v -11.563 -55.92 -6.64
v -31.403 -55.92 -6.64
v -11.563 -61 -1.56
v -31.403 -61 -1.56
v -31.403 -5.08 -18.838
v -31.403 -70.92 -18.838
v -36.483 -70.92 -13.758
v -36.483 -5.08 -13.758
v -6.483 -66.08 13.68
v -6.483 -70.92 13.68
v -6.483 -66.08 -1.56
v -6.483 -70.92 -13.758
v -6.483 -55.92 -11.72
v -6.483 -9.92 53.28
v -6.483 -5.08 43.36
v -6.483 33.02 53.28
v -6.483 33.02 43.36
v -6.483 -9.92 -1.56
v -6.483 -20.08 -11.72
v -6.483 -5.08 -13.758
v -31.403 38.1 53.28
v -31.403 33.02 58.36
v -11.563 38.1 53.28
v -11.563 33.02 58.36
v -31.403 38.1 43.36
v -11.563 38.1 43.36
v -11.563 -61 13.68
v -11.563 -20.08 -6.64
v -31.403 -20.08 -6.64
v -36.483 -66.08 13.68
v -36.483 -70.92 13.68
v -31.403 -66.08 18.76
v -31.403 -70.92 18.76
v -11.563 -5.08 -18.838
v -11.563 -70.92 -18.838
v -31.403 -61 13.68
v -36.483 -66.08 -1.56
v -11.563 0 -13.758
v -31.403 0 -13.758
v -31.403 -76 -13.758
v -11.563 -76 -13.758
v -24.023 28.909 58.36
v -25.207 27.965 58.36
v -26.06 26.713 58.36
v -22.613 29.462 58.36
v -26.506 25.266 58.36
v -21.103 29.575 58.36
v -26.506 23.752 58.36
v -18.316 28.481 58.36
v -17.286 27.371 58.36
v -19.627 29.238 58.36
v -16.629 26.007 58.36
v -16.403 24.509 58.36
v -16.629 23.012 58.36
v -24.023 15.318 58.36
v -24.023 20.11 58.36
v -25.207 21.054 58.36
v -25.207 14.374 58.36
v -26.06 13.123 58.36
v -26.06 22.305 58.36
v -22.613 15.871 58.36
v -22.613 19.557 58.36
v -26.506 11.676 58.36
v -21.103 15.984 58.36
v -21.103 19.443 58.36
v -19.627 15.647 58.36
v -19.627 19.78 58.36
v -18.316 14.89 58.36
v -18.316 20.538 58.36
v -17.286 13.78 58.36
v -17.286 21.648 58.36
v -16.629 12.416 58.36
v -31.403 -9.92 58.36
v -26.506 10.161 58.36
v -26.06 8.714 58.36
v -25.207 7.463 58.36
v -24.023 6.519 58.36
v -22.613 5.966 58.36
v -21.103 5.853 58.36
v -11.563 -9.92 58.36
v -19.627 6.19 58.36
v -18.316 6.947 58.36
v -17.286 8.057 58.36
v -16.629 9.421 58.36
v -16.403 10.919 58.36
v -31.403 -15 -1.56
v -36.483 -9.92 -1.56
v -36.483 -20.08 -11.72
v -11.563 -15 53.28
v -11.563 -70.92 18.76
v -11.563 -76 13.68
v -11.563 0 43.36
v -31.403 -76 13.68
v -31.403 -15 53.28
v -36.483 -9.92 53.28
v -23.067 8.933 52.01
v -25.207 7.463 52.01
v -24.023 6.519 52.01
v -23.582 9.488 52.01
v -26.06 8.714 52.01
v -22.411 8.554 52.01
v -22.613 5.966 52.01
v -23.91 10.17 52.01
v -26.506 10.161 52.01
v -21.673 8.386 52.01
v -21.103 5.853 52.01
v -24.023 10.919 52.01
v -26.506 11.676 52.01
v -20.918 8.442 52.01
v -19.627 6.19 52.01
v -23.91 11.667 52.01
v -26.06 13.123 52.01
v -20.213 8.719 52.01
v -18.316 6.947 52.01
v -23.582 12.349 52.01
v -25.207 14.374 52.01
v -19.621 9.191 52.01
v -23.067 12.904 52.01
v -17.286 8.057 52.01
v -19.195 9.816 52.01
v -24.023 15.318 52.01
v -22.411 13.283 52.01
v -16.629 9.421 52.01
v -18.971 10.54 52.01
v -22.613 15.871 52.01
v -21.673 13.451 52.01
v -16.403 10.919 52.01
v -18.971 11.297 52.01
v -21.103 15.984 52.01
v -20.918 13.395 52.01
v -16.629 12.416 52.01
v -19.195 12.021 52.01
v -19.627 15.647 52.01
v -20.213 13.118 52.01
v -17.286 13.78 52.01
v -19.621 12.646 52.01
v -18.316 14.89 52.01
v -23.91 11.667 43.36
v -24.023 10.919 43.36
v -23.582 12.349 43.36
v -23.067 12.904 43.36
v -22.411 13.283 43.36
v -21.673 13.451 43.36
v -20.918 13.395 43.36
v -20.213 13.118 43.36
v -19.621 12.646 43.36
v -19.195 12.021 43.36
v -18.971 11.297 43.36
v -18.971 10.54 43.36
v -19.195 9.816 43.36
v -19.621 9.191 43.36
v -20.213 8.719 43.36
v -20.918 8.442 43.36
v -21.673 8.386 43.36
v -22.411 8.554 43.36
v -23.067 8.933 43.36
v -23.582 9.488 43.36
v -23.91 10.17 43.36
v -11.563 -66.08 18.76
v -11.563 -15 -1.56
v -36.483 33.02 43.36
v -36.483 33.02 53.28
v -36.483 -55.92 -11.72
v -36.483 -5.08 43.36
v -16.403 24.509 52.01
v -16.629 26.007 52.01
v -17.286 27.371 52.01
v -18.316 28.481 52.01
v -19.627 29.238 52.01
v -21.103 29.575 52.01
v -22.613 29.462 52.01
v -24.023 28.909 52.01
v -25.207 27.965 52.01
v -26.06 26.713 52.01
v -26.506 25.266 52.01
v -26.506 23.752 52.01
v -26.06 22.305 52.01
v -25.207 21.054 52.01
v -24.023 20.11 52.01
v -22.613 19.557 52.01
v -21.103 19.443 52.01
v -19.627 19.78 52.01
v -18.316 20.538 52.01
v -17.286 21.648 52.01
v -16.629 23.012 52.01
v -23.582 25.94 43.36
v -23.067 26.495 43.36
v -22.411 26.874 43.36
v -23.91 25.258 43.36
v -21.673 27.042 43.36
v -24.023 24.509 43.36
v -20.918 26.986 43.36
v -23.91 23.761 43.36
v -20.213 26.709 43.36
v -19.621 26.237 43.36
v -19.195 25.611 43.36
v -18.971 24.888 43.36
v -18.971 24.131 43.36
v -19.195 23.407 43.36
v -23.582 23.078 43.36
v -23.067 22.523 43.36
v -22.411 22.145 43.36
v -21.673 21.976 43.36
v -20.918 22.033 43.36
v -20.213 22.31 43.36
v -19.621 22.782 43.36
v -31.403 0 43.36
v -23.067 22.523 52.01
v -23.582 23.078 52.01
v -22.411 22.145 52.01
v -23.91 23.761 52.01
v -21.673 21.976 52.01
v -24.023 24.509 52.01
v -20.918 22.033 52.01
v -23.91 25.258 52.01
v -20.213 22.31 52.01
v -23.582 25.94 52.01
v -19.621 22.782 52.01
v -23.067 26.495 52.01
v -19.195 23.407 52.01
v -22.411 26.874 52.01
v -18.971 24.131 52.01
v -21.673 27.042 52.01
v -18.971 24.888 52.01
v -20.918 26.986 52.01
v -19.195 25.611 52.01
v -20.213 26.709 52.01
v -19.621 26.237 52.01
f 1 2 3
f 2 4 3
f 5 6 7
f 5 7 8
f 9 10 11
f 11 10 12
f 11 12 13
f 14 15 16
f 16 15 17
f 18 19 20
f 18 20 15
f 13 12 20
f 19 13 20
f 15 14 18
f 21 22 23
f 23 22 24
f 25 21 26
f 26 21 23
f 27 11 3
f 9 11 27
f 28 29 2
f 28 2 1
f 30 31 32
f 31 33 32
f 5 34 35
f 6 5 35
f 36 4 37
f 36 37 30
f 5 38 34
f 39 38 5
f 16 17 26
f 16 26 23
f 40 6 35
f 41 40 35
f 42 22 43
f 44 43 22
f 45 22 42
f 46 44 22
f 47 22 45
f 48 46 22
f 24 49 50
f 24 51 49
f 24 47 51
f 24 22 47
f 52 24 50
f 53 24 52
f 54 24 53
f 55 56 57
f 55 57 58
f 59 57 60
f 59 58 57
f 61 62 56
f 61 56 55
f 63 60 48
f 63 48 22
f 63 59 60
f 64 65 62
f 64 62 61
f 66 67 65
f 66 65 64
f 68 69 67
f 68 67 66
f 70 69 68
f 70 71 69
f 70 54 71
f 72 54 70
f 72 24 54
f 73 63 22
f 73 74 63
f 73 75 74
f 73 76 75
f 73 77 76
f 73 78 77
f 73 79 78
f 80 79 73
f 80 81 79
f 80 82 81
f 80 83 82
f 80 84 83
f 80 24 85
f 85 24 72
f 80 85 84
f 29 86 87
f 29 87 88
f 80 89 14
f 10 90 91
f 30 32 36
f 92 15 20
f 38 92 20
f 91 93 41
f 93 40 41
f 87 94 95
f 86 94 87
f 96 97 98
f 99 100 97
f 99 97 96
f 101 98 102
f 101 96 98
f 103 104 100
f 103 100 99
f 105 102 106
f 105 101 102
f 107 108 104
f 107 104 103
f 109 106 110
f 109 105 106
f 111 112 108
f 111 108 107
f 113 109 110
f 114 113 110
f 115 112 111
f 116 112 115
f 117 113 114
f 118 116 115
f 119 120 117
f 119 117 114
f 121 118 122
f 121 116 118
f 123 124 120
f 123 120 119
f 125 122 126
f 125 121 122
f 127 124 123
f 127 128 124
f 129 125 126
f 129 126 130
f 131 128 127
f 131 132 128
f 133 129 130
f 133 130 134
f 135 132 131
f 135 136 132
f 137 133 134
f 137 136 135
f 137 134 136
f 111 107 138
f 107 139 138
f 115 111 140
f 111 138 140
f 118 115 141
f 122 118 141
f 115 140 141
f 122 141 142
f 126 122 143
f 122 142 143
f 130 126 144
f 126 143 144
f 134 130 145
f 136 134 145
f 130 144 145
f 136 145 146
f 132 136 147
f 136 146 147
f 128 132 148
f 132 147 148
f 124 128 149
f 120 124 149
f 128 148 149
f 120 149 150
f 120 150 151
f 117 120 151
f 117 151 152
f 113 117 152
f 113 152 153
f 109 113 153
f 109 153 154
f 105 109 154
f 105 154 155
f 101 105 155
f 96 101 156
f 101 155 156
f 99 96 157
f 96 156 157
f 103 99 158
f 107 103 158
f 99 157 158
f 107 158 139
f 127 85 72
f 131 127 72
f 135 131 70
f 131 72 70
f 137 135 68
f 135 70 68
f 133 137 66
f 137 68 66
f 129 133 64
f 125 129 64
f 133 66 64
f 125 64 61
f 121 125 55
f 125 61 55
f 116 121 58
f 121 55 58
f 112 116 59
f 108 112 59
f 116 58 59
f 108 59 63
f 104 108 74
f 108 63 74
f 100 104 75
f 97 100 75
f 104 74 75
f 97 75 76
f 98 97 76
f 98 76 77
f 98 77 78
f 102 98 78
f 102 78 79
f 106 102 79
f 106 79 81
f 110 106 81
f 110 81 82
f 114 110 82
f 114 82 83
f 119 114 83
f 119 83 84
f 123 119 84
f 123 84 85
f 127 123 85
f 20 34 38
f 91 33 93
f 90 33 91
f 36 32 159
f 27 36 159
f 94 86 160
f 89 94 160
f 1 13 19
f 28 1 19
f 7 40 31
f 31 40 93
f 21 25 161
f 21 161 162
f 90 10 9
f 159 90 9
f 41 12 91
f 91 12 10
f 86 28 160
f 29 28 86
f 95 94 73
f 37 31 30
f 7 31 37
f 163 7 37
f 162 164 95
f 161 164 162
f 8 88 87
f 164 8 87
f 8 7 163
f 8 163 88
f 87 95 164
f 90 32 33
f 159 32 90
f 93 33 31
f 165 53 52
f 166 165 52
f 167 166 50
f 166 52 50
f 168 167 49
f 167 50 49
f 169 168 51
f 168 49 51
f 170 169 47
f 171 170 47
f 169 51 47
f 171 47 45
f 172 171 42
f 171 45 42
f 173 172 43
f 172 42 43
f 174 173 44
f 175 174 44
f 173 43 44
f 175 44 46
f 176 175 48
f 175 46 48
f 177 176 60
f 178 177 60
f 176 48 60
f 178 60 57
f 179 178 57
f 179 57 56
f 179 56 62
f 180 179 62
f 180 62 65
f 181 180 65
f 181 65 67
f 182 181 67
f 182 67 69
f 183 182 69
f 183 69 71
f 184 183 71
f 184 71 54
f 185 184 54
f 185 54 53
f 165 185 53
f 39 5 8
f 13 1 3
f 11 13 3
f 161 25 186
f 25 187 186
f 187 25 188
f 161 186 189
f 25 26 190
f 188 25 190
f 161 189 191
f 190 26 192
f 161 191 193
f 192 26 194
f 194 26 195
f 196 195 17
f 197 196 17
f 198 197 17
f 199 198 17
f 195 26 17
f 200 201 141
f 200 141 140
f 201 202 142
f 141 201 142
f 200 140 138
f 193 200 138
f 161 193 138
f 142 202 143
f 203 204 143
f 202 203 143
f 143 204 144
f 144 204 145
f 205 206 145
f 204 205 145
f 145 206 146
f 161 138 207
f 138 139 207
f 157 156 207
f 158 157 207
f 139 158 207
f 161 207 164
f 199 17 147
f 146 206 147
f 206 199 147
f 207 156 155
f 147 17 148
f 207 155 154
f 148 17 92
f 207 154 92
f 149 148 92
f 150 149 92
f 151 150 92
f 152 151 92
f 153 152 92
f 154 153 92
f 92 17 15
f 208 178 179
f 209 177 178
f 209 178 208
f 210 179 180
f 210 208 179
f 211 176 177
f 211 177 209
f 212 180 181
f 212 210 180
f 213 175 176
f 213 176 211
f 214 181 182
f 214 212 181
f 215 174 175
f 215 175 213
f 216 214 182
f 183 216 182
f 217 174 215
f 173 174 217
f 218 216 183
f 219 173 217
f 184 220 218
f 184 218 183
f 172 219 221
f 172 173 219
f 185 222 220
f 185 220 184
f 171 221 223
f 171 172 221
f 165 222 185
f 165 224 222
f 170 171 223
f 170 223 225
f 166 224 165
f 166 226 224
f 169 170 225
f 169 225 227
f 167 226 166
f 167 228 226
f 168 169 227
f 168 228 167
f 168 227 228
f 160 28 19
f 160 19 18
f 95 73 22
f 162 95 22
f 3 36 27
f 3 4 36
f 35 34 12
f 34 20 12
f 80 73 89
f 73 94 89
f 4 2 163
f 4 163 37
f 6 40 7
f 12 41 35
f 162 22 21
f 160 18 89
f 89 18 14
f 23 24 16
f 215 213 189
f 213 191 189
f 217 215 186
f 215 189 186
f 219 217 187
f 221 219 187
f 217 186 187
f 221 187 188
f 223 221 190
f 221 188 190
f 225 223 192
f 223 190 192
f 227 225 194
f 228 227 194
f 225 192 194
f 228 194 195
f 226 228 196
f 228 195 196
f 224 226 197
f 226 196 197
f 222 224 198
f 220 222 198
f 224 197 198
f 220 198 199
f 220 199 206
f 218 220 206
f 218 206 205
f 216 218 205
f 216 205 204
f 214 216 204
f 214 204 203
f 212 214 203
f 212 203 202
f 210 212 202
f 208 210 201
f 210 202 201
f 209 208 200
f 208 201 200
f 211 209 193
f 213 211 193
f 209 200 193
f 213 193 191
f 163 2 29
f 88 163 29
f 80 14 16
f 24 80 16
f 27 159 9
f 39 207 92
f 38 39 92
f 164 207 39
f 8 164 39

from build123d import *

# Parameters (mm, degrees)
F0_W            = 30
F0_H            = 15
F0_H_2          = 50
F0_H_3          = 25.4
F1_DEPTH        = 15
F2_DEPTH        = 38.1
F5_W            = 38.1
F5_H            = 15
F6_ANGLE        = 60
F7_DEPTH        = 61
F8_DEPTH        = 15
F9_W            = 30
F9_H            = 15
F10_DEPTH       = 25.4
F12_DEPTH       = 26.924
F14_D           = 5.08
F14_CBORE_D     = 10.16
F14_CBORE_DEPTH = 6.35
F15_D           = 5.08
F15_CBORE_D     = 10.16
F15_CBORE_DEPTH = 6.35
F17_DEPTH       = 60.96
F18_DEPTH       = 45.212
F19_SIZE        = 5.08


# Not quite as in the source:
# - a feature of the source that left no trace in its solid (it failed there, or was rolled back) is left out


with BuildPart() as f1:
    # F0 (on Front) → F1 (new body)
    with BuildSketch(Plane.XZ):
        with Locations((-21.4830274055, 50.8597951472)):
            Rectangle(F0_W, F0_H)
        with Locations((-21.4830274055, 18.3597951472)):
            Rectangle(F0_W, F0_H_2)
        with Locations((-21.4830274055, -19.3402048528)):
            Rectangle(F0_W, F0_H_3)
    extrude(amount=F1_DEPTH)

    # F0 (on Front) → F2 (join)
    with BuildSketch(Plane.XZ):
        with Locations((-21.4830274055, 50.8597951472)):
            Rectangle(F0_W, F0_H)
    extrude(amount=-F2_DEPTH)

    # F5 (on face) → F6 (revolve)
    with BuildSketch(Plane.YZ.offset(-6.4830274055)):
        with Locations((19.05, 50.8597951472)):
            Rectangle(F5_W, F5_H)
    revolve(axis=Axis((-6.4830274055, 0, 50.8597951472), (0, 0, -1)), revolution_arc=F6_ANGLE)

    # F0 (on Front) → F7 (join)
    with BuildSketch(Plane.XZ):
        with Locations((-21.4830274055, -19.3402048528)):
            Rectangle(F0_W, F0_H_3)
    extrude(amount=F7_DEPTH)

    # F8 (add): a face of the model
    f8_faces = [f1.faces().sort_by_distance(p)[0] for p in [
        (-21.4830274055, -61, -19.3402048528),
    ]]
    extrude(f8_faces, amount=F8_DEPTH)

    # F9 (on face) → F10 (join)
    with BuildSketch(Plane.XY.offset(-6.6402048528)):
        with Locations((-21.4830274055, -68.5)):
            Rectangle(F9_W, F9_H)
    extrude(amount=F10_DEPTH)

    # F11 (on face) → F12 (cut)
    with BuildSketch(Plane.XY.offset(58.3597951472)):
        with BuildLine():
            Line((-6.4830274055, 38.1), (-6.4830274055, 0))
            Line((-6.4830274055, 0), (26.5125404787, 19.05))
            ThreePointArc((26.5125404787, 19.05), (12.5669725945, 32.9955678842), (-6.4830274055, 38.1))
        make_face()
    extrude(amount=-F12_DEPTH, mode=Mode.SUBTRACT)

    # F14 (through all)
    with Locations(Plane.XY.offset(58.3597951472)):
        with Locations((-21.4830274055, 24.5092792876)):
            CounterBoreHole(F14_D / 2, F14_CBORE_D / 2, F14_CBORE_DEPTH)

    # F15 (through all)
    with Locations(Plane.XY.offset(58.3597951472)):
        with Locations((-21.4830274055, 10.9185585752)):
            CounterBoreHole(F15_D / 2, F15_CBORE_D / 2, F15_CBORE_DEPTH)

    # F16 (on face) → F17 (cut)
    with BuildSketch(Plane.YZ.offset(-6.4830274055)):
        Polygon((0, -18.8376810402), (-69.65, -18.8376810402), (-76, -18.8376810402), (-76, -32.0402048528), (0, -32.0402048528), align=None)
        Polygon((13.4356496856, -18.8376810402), (0, -18.8376810402), (0, -32.0402048528), (-76, -32.0402048528), (-76, -18.8376810402), (-82.0414423943, -18.8376810402), (-82.0414423943, -58.5641600192), (13.4356496856, -58.5641600192), align=None)
    extrude(amount=-F17_DEPTH, mode=Mode.SUBTRACT)

    # F16 (on face) → F18 (cut)
    with BuildSketch(Plane.YZ.offset(-6.4830274055)):
        Polygon((13.4356496856, -18.8376810402), (0, -18.8376810402), (0, -32.0402048528), (-76, -32.0402048528), (-76, -18.8376810402), (-82.0414423943, -18.8376810402), (-82.0414423943, -58.5641600192), (13.4356496856, -58.5641600192), align=None)
        Polygon((0, -18.8376810402), (-69.65, -18.8376810402), (-76, -18.8376810402), (-76, -32.0402048528), (0, -32.0402048528), align=None)
    extrude(amount=-F18_DEPTH, mode=Mode.SUBTRACT)

    # F19
    f19_edges = [f1.edges().sort_by_distance(p)[0] for p in [
        (-6.483027, -38, -6.640205),
        (-36.483027, -38, -6.640205),
        (-36.483027, -68.5, 18.759795),
        (-21.483027, -76, 18.759795),
        (-6.483027, -68.5, 18.759795),
        (-21.483027, -61, 18.759795),
        (-36.483027, -76, -0.038943),
        (-6.483027, -76, -0.038943),
        (-21.483027, -76, -18.837681),
        (-6.483027, -38, -18.837681),
        (-36.483027, -38, -18.837681),
        (-21.483027, 0, -18.837681),
        (-21.483027, -15, 58.359795),
        (-6.483027, -15, 25.859795),
        (-21.483027, -15, -6.640205),
        (-36.483027, -15, 25.859795),
        (-6.483027, -61, 6.059795),
        (-36.483027, -61, 6.059795),
        (-21.483027, -61, -6.640205),
        (-6.483027, 11.55, 58.359795),
        (-36.483027, 11.55, 58.359795),
        (-21.483027, 38.1, 58.359795),
        (-6.483027, 0, 12.261057),
        (-36.483027, 0, 12.261057),
        (-6.483027, 38.1, 50.859795),
        (-36.483027, 38.1, 50.859795),
    ]]
    chamfer(f19_edges, length=F19_SIZE)


solid = f1.part
